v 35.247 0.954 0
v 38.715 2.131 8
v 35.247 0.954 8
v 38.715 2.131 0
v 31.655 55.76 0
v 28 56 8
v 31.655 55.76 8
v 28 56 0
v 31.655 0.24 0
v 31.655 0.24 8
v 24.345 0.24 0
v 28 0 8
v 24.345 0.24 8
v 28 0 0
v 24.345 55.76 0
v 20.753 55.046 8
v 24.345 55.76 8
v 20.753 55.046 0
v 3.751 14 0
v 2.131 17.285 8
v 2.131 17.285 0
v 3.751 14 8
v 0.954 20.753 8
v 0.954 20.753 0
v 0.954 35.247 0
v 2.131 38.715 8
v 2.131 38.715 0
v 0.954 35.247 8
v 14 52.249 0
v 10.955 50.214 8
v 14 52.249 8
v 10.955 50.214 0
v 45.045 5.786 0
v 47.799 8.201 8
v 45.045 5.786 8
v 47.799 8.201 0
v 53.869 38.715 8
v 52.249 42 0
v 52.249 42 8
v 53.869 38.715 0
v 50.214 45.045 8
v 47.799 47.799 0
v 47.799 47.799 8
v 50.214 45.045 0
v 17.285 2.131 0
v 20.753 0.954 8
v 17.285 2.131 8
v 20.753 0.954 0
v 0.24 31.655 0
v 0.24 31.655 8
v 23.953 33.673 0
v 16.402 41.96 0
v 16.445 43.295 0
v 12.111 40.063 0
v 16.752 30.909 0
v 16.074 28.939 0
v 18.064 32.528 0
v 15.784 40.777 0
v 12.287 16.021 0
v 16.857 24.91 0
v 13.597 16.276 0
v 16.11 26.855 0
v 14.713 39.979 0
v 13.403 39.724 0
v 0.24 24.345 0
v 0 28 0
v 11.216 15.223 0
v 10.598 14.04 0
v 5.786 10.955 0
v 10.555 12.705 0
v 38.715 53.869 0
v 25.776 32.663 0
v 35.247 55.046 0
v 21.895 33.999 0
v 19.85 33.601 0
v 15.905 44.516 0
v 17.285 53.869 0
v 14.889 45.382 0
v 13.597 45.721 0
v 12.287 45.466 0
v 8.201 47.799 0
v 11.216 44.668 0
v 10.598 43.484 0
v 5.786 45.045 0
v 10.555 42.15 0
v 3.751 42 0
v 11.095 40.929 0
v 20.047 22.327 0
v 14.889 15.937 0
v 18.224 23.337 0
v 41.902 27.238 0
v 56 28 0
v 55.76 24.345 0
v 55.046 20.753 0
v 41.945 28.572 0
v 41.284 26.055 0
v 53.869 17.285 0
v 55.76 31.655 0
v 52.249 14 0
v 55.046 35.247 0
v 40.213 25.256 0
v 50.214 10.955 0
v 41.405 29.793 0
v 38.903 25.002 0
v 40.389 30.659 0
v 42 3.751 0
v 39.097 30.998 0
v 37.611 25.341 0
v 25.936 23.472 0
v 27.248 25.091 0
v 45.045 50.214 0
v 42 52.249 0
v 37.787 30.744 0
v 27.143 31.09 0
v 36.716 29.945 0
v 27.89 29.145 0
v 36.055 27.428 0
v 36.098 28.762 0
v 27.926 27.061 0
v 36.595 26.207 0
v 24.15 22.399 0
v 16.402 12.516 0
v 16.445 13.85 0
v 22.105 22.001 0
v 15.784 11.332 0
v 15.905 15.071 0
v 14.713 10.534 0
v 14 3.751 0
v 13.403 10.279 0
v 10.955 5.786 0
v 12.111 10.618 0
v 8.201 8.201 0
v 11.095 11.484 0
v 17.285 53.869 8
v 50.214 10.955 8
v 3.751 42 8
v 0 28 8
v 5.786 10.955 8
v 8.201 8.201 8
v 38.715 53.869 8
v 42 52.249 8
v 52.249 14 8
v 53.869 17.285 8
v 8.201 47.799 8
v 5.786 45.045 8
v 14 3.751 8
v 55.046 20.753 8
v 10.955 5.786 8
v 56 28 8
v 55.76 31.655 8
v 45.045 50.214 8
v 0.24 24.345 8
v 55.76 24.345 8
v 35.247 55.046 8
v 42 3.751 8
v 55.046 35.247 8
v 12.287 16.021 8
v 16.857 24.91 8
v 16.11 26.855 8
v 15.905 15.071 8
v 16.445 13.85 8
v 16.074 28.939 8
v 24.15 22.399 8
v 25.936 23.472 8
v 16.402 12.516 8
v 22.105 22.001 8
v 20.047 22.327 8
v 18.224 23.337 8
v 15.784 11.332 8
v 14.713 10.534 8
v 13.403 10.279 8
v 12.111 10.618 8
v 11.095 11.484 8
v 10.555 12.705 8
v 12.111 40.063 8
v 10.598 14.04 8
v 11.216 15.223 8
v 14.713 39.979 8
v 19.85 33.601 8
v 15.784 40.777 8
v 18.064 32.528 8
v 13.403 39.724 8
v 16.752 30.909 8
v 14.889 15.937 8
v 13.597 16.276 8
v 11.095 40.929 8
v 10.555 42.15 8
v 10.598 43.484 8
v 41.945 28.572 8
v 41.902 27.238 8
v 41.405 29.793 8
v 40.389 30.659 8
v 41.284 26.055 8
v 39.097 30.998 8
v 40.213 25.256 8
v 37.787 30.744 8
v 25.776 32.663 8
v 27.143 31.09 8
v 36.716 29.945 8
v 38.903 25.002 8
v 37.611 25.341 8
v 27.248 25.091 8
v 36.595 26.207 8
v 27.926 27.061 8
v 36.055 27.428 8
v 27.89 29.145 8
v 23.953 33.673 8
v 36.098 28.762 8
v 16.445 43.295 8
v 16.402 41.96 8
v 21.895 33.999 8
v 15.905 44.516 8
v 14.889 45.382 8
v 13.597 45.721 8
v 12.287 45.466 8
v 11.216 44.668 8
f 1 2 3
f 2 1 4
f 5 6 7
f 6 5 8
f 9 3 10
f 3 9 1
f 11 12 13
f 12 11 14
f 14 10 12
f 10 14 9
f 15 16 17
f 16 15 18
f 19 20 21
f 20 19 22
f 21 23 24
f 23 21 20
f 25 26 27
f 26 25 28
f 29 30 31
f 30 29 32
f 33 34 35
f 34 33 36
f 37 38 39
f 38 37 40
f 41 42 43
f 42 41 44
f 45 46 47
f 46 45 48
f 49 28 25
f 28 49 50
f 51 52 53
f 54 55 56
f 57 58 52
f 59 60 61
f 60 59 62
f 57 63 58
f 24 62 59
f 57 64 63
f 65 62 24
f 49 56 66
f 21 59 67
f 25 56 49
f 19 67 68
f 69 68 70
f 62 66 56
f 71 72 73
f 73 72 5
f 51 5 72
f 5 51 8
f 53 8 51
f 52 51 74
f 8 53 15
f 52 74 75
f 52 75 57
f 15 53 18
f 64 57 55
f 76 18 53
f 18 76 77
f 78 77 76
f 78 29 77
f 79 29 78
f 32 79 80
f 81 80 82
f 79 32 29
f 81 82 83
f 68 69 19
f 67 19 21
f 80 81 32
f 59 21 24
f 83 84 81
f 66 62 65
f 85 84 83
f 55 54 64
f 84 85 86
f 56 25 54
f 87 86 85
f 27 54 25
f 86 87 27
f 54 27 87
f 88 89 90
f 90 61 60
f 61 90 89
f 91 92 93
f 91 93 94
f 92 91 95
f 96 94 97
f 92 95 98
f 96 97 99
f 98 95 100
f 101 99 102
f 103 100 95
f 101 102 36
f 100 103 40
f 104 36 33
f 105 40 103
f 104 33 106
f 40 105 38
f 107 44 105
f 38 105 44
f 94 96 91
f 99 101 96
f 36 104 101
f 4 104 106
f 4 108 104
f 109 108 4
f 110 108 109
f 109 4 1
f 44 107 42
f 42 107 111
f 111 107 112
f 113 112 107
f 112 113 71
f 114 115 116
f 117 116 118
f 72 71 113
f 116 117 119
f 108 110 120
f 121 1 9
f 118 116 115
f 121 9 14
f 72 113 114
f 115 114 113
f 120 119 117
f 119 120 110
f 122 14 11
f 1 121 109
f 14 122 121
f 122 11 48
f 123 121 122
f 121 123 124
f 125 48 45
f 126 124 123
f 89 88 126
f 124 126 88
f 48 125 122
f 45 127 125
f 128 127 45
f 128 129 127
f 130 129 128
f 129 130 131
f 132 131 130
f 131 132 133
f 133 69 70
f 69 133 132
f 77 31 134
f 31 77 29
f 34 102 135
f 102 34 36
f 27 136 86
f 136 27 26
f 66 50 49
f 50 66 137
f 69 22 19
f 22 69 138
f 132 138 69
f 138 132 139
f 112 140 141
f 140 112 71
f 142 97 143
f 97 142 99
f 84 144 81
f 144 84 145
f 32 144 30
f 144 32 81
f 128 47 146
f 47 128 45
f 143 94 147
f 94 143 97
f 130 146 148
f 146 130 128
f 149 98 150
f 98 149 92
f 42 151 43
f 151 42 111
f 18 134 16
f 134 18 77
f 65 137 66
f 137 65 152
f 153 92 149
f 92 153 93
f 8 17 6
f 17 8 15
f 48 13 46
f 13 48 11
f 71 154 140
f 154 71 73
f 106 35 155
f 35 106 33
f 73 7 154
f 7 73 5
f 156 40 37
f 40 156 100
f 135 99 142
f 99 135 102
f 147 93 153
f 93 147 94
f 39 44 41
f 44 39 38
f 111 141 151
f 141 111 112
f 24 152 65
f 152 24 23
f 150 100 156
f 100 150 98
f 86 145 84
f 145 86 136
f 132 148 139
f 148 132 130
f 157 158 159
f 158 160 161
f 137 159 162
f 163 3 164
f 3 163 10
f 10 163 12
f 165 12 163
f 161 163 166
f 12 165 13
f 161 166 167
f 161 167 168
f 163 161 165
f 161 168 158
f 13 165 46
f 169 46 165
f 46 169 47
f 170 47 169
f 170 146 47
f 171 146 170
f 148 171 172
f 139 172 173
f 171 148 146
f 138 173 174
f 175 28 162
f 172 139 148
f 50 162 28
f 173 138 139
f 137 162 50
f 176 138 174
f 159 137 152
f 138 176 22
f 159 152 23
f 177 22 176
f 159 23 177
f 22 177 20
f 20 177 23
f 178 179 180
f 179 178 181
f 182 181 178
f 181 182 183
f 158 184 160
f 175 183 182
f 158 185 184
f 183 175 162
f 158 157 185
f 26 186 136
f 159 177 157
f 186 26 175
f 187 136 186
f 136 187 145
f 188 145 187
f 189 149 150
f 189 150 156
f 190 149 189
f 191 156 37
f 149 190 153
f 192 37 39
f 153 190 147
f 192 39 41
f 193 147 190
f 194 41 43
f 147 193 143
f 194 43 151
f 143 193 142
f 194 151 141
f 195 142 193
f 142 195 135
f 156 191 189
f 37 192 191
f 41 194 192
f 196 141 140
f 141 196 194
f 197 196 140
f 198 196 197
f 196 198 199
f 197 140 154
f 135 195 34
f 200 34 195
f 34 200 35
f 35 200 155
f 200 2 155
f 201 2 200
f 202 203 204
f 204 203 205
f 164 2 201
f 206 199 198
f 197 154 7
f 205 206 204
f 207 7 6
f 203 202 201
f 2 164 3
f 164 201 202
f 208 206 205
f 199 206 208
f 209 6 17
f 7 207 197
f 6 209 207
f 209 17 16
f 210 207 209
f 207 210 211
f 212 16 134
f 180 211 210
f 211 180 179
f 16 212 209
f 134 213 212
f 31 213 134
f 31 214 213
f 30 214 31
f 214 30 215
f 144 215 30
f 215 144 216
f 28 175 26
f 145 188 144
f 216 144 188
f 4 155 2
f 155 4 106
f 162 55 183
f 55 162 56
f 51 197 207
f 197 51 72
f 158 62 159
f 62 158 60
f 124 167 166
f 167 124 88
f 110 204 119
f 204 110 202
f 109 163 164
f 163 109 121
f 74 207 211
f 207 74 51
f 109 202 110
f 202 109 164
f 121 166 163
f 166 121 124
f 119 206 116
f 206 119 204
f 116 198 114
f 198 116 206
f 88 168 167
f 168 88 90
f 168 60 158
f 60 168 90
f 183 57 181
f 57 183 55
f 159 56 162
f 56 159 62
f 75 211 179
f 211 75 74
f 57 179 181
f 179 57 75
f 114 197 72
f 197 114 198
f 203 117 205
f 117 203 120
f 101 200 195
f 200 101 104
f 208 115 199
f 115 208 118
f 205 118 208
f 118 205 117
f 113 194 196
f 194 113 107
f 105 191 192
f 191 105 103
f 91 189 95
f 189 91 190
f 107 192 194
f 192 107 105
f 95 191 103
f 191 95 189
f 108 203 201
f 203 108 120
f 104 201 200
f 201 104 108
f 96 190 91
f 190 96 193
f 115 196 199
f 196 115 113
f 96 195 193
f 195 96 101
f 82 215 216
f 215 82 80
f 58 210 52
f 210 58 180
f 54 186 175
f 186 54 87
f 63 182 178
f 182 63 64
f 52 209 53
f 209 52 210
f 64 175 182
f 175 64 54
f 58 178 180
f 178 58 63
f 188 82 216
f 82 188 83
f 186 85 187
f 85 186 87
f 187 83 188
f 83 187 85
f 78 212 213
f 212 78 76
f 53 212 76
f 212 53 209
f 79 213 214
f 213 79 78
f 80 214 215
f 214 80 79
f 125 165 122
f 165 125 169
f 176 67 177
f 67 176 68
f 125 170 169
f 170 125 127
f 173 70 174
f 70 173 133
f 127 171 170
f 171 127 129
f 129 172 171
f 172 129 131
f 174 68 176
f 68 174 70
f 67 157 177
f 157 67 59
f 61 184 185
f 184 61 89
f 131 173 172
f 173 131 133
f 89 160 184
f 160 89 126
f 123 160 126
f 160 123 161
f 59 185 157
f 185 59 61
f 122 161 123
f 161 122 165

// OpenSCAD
$fn = 32;

// ----------------------------------------------------------------------
// Cam plate: eccentric cam, base R28
// ----------------------------------------------------------------------

// --- parameters (mm) ---
base_r = 28;              // base circle radius
lobe_h = 8;               // cam lobe rise
bore_r = 6;               // shaft bore radius
plate_t = 8;              // plate thickness, Z (extrusion height)
ecc = 6;                  // disc eccentricity
ring_r = 17;              // lightening ring radius
bolt_r = 3;               // lightening hole radius

profile = [[56, 28], [55.76, 31.655], [55.046, 35.247], [53.869, 38.715], [52.249, 42], [50.214, 45.045], [47.799, 47.799], [45.045, 50.214], [42, 52.249], [38.715, 53.869], [35.247, 55.046], [31.655, 55.76], [28, 56], [24.345, 55.76], [20.753, 55.046], [17.285, 53.869], [14, 52.249], [10.955, 50.214], [8.201, 47.799], [5.786, 45.045], [3.751, 42], [2.131, 38.715], [0.954, 35.247], [0.24, 31.655], [0, 28], [0.24, 24.345], [0.954, 20.753], [2.131, 17.285], [3.751, 14], [5.786, 10.955], [8.201, 8.201], [10.955, 5.786], [14, 3.751], [17.285, 2.131], [20.753, 0.954], [24.345, 0.24], [28, 0], [31.655, 0.24], [35.247, 0.954], [38.715, 2.131], [42, 3.751], [45.045, 5.786], [47.799, 8.201], [50.214, 10.955], [52.249, 14], [53.869, 17.285], [55.046, 20.753], [55.76, 24.345]];  // primary outline, 48 points, counter clockwise
void_1 = [[27.89, 29.145], [27.143, 31.09], [25.776, 32.663], [23.953, 33.673], [21.895, 33.999], [19.85, 33.601], [18.064, 32.528], [16.752, 30.909], [16.074, 28.939], [16.11, 26.855], [16.857, 24.91], [18.224, 23.337], [20.047, 22.327], [22.105, 22.001], [24.15, 22.399], [25.936, 23.472], [27.248, 25.091], [27.926, 27.061]];  // shaft bore, 18 points
void_2 = [[41.945, 28.572], [41.405, 29.793], [40.389, 30.659], [39.097, 30.998], [37.787, 30.744], [36.716, 29.945], [36.098, 28.762], [36.055, 27.428], [36.595, 26.207], [37.611, 25.341], [38.903, 25.002], [40.213, 25.256], [41.284, 26.055], [41.902, 27.238]];  // lightening hole 1, 14 points
void_3 = [[16.445, 43.295], [15.905, 44.516], [14.889, 45.382], [13.597, 45.721], [12.287, 45.466], [11.216, 44.668], [10.598, 43.484], [10.555, 42.15], [11.095, 40.929], [12.111, 40.063], [13.403, 39.724], [14.713, 39.979], [15.784, 40.777], [16.402, 41.96]];  // lightening hole 2, 14 points
void_4 = [[16.445, 13.85], [15.905, 15.071], [14.889, 15.937], [13.597, 16.276], [12.287, 16.021], [11.216, 15.223], [10.598, 14.04], [10.555, 12.705], [11.095, 11.484], [12.111, 10.618], [13.403, 10.279], [14.713, 10.534], [15.784, 11.332], [16.402, 12.516]];  // lightening hole 3, 14 points

// --- the one profile operation ---
difference() {
  linear_extrude(height = plate_t) polygon(points = profile);
  translate([0, 0, -1])
    linear_extrude(height = plate_t + 2) polygon(points = void_1);
  translate([0, 0, -1])
    linear_extrude(height = plate_t + 2) polygon(points = void_2);
  translate([0, 0, -1])
    linear_extrude(height = plate_t + 2) polygon(points = void_3);
  translate([0, 0, -1])
    linear_extrude(height = plate_t + 2) polygon(points = void_4);
}
